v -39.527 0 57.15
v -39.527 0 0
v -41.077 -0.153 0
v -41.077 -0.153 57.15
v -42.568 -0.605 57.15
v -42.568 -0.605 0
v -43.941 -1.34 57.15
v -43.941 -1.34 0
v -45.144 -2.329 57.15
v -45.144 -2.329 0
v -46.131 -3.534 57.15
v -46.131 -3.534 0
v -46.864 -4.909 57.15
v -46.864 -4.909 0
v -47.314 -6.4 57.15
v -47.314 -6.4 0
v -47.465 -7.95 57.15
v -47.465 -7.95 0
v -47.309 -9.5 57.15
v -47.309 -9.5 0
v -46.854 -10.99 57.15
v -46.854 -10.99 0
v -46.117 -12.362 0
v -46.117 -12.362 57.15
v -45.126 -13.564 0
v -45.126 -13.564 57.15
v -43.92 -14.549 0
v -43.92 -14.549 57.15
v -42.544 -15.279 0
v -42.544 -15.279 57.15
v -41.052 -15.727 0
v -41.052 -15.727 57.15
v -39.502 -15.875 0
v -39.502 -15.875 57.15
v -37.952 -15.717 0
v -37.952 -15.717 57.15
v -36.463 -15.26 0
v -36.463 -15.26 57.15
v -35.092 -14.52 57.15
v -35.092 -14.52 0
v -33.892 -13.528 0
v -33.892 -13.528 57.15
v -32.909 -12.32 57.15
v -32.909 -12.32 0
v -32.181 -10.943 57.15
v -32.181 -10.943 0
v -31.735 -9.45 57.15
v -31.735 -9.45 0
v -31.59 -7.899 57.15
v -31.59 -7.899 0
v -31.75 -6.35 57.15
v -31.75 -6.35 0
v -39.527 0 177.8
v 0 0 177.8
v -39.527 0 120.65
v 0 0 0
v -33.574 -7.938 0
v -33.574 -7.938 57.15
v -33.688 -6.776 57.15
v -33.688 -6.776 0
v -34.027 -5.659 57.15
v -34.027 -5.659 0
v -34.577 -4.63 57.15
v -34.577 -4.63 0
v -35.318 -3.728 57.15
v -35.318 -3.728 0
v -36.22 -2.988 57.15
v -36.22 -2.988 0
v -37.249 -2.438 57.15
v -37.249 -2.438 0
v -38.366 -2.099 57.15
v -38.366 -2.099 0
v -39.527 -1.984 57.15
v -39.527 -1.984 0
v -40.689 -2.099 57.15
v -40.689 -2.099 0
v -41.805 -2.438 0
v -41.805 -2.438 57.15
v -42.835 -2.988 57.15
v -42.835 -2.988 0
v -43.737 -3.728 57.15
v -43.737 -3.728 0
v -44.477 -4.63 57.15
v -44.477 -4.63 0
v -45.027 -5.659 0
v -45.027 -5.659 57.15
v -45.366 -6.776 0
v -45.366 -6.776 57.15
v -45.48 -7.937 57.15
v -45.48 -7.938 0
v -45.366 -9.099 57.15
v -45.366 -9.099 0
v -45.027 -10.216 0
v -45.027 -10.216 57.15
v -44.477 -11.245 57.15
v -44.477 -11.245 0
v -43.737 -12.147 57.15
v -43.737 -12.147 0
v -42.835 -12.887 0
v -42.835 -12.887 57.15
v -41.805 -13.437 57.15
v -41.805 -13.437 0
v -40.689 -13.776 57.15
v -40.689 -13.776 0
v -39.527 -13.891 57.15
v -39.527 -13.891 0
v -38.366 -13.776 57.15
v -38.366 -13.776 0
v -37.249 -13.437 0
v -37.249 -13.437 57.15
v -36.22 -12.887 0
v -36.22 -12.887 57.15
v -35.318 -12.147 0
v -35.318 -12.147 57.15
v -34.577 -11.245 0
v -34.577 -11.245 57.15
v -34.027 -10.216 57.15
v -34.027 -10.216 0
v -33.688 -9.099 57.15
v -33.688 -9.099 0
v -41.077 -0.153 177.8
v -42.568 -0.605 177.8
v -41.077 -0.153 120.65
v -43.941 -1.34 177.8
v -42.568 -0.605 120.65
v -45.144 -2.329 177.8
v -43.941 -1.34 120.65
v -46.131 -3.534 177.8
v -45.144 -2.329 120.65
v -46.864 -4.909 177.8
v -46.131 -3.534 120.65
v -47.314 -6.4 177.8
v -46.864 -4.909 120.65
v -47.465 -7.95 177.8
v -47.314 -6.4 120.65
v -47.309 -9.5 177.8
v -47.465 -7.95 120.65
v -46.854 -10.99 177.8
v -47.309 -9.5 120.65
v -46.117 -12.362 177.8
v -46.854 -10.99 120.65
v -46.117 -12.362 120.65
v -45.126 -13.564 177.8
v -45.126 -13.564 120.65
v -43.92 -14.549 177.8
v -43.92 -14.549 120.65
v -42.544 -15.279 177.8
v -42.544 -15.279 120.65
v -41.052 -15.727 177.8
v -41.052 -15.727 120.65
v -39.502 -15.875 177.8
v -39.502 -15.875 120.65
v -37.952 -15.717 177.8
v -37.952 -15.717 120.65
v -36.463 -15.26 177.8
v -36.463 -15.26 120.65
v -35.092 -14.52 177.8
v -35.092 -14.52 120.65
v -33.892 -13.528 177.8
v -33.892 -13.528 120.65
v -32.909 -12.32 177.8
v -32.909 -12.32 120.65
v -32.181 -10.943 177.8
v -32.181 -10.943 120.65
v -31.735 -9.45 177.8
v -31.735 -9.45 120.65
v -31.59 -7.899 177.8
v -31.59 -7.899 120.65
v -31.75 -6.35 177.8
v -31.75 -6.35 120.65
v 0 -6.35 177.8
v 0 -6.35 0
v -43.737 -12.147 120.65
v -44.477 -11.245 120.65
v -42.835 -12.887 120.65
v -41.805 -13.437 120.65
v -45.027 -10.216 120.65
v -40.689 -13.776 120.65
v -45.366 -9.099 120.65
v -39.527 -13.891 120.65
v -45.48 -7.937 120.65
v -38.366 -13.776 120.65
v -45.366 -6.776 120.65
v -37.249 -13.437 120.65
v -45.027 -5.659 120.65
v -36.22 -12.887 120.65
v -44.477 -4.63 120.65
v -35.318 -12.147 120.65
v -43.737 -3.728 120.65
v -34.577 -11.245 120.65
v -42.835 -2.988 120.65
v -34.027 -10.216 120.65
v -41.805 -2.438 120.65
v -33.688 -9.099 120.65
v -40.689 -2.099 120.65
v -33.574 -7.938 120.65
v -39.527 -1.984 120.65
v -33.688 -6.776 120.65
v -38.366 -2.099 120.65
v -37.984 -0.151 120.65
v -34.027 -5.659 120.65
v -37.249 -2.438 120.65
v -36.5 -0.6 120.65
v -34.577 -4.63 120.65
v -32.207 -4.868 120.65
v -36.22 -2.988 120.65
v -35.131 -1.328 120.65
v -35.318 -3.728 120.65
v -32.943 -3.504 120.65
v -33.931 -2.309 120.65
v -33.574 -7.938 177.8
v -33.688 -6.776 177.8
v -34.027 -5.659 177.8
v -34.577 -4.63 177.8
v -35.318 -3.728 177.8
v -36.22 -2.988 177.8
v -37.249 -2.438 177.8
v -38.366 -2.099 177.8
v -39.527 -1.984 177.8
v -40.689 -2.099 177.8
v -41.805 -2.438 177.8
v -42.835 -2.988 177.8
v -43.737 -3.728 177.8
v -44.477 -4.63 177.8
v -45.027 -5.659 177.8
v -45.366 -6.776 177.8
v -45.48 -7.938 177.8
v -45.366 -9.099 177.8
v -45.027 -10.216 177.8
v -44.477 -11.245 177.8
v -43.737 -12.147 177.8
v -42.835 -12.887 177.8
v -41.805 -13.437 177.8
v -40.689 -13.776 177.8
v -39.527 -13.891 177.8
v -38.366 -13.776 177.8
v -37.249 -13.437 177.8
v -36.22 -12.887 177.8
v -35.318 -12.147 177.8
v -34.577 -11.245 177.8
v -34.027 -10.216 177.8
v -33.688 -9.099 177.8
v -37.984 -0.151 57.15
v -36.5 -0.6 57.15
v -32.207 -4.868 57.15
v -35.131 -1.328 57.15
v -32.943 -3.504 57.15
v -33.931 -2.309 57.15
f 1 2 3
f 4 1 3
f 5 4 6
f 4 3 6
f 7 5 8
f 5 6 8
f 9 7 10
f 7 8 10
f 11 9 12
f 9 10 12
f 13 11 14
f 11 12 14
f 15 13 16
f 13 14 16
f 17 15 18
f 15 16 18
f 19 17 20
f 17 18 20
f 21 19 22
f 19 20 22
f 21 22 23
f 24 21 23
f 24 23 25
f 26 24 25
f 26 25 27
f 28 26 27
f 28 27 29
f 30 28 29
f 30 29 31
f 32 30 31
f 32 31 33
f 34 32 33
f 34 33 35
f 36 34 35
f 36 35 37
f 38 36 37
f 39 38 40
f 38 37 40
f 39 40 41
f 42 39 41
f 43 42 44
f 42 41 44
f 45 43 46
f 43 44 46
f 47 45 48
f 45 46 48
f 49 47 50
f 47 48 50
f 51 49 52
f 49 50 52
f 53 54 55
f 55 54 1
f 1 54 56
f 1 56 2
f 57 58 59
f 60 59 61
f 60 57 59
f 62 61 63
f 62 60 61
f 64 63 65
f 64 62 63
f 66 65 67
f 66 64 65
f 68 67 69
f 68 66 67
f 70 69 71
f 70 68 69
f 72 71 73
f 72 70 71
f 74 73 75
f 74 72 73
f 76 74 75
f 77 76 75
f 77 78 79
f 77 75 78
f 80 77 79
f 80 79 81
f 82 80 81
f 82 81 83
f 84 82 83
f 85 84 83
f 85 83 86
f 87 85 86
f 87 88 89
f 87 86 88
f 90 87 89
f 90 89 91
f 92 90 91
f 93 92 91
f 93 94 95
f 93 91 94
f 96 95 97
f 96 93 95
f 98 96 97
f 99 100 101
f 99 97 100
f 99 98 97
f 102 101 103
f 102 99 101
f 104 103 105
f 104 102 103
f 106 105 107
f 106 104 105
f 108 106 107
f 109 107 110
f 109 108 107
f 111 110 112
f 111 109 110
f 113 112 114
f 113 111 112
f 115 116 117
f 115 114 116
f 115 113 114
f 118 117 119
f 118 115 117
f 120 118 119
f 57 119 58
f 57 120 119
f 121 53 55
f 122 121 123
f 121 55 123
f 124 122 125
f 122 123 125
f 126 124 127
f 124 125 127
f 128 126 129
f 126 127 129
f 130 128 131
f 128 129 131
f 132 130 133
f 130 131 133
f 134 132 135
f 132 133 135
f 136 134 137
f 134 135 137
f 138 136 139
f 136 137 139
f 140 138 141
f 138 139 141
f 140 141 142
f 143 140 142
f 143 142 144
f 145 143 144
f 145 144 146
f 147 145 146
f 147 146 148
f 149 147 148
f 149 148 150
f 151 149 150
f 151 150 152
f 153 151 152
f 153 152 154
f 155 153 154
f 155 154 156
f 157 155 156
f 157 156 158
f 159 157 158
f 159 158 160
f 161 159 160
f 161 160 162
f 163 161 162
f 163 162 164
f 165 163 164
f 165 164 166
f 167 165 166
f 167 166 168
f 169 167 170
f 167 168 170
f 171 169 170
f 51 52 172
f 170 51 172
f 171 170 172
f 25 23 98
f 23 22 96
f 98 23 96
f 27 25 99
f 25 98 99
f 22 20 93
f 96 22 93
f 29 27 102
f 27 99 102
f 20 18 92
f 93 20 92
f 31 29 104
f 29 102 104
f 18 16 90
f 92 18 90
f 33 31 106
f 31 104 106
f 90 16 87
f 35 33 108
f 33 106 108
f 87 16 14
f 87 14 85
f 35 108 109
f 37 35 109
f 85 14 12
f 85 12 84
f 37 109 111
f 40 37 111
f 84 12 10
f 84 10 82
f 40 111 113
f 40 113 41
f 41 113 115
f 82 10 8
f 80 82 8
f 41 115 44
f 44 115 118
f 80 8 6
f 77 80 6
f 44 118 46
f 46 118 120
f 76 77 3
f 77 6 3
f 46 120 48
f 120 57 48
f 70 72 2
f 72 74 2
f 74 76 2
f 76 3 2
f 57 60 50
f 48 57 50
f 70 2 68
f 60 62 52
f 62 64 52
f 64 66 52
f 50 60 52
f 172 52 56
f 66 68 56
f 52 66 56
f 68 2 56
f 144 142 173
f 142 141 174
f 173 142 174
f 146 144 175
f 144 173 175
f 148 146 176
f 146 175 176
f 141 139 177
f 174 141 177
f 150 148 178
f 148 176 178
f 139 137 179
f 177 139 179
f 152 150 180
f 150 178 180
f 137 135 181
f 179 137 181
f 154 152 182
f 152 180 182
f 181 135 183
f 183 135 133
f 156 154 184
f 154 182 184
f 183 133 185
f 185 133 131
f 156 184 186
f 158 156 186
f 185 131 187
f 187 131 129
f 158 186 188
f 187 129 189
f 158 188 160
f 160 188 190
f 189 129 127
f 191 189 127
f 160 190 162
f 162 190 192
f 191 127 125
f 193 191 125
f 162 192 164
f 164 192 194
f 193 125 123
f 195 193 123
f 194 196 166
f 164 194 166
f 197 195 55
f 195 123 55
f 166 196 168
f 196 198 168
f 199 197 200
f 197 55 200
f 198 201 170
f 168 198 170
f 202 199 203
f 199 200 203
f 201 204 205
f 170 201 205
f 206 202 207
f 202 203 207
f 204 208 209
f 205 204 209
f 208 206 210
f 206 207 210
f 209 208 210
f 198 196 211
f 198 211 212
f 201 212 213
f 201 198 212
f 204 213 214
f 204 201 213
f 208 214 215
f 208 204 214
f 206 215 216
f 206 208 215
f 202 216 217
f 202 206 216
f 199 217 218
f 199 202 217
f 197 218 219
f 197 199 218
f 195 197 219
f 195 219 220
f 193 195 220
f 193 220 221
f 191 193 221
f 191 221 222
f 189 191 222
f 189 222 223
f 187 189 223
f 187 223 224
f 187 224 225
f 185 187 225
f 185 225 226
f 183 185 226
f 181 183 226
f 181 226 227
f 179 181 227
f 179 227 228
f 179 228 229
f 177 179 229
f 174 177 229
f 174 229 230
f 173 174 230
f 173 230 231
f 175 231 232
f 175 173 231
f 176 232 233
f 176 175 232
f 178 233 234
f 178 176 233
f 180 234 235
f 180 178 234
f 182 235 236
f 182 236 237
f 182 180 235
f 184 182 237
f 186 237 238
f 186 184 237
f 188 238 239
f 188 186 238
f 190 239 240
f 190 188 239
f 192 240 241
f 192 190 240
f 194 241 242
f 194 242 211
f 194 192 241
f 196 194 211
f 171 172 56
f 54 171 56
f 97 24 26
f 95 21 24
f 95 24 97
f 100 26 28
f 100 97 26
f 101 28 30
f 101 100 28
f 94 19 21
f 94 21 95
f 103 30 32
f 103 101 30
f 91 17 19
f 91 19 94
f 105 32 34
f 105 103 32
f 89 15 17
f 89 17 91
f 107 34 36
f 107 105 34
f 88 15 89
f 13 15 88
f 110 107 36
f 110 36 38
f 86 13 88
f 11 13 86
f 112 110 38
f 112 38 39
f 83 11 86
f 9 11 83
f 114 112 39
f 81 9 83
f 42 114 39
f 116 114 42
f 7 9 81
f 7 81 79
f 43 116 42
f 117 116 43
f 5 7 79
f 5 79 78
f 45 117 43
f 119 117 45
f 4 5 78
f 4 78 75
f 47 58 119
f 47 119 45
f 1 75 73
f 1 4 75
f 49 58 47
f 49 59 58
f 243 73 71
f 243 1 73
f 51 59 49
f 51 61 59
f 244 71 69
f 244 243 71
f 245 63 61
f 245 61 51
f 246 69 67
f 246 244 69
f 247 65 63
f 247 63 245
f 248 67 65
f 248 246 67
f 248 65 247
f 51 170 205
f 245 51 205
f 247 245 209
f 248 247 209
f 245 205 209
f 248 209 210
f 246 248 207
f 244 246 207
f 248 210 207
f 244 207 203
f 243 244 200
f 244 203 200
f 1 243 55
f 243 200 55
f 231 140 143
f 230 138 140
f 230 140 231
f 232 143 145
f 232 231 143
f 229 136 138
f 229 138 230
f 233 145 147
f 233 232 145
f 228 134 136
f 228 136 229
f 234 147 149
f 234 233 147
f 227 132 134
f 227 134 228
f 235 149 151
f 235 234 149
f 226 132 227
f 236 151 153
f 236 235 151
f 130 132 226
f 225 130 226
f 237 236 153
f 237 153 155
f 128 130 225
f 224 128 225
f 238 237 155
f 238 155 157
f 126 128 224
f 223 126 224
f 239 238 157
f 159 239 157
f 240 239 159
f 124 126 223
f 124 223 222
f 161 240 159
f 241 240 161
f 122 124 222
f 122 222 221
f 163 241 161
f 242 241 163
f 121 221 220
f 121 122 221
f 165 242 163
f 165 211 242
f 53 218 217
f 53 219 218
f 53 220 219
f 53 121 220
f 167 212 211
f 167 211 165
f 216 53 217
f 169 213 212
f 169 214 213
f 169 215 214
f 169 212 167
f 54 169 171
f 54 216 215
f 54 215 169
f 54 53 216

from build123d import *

# Parameters (mm, degrees)
F0_R     = 5.953125
F1_DEPTH = 177.8
F3_R     = 7.9375
F4_DEPTH = 31.75


with BuildPart() as f1:
    # F0 (on Top) → F1 (new body)
    with BuildSketch(Plane.XY):
        with BuildLine():
            Line((0, -6.35), (0, 0))
            Line((0, 0), (-39.5271299333, 0))
            ThreePointArc((-39.5271299333, 0), (-44.5472457189, -14.0858610621), (-31.75, -6.35))
            Line((-31.75, -6.35), (0, -6.35))
        make_face()
        with Locations((-39.5271299333, -7.9375)):
            Circle(F0_R, mode=Mode.SUBTRACT)
    extrude(amount=F1_DEPTH)

    # F3 (on mid) → F4 (cut, symmetric)
    with BuildSketch(Plane.XY.offset(88.9)):
        with Locations((-39.5271299333, -7.9375)):
            Circle(F3_R)
    extrude(amount=F4_DEPTH, both=True, mode=Mode.SUBTRACT)


solid = f1.part
